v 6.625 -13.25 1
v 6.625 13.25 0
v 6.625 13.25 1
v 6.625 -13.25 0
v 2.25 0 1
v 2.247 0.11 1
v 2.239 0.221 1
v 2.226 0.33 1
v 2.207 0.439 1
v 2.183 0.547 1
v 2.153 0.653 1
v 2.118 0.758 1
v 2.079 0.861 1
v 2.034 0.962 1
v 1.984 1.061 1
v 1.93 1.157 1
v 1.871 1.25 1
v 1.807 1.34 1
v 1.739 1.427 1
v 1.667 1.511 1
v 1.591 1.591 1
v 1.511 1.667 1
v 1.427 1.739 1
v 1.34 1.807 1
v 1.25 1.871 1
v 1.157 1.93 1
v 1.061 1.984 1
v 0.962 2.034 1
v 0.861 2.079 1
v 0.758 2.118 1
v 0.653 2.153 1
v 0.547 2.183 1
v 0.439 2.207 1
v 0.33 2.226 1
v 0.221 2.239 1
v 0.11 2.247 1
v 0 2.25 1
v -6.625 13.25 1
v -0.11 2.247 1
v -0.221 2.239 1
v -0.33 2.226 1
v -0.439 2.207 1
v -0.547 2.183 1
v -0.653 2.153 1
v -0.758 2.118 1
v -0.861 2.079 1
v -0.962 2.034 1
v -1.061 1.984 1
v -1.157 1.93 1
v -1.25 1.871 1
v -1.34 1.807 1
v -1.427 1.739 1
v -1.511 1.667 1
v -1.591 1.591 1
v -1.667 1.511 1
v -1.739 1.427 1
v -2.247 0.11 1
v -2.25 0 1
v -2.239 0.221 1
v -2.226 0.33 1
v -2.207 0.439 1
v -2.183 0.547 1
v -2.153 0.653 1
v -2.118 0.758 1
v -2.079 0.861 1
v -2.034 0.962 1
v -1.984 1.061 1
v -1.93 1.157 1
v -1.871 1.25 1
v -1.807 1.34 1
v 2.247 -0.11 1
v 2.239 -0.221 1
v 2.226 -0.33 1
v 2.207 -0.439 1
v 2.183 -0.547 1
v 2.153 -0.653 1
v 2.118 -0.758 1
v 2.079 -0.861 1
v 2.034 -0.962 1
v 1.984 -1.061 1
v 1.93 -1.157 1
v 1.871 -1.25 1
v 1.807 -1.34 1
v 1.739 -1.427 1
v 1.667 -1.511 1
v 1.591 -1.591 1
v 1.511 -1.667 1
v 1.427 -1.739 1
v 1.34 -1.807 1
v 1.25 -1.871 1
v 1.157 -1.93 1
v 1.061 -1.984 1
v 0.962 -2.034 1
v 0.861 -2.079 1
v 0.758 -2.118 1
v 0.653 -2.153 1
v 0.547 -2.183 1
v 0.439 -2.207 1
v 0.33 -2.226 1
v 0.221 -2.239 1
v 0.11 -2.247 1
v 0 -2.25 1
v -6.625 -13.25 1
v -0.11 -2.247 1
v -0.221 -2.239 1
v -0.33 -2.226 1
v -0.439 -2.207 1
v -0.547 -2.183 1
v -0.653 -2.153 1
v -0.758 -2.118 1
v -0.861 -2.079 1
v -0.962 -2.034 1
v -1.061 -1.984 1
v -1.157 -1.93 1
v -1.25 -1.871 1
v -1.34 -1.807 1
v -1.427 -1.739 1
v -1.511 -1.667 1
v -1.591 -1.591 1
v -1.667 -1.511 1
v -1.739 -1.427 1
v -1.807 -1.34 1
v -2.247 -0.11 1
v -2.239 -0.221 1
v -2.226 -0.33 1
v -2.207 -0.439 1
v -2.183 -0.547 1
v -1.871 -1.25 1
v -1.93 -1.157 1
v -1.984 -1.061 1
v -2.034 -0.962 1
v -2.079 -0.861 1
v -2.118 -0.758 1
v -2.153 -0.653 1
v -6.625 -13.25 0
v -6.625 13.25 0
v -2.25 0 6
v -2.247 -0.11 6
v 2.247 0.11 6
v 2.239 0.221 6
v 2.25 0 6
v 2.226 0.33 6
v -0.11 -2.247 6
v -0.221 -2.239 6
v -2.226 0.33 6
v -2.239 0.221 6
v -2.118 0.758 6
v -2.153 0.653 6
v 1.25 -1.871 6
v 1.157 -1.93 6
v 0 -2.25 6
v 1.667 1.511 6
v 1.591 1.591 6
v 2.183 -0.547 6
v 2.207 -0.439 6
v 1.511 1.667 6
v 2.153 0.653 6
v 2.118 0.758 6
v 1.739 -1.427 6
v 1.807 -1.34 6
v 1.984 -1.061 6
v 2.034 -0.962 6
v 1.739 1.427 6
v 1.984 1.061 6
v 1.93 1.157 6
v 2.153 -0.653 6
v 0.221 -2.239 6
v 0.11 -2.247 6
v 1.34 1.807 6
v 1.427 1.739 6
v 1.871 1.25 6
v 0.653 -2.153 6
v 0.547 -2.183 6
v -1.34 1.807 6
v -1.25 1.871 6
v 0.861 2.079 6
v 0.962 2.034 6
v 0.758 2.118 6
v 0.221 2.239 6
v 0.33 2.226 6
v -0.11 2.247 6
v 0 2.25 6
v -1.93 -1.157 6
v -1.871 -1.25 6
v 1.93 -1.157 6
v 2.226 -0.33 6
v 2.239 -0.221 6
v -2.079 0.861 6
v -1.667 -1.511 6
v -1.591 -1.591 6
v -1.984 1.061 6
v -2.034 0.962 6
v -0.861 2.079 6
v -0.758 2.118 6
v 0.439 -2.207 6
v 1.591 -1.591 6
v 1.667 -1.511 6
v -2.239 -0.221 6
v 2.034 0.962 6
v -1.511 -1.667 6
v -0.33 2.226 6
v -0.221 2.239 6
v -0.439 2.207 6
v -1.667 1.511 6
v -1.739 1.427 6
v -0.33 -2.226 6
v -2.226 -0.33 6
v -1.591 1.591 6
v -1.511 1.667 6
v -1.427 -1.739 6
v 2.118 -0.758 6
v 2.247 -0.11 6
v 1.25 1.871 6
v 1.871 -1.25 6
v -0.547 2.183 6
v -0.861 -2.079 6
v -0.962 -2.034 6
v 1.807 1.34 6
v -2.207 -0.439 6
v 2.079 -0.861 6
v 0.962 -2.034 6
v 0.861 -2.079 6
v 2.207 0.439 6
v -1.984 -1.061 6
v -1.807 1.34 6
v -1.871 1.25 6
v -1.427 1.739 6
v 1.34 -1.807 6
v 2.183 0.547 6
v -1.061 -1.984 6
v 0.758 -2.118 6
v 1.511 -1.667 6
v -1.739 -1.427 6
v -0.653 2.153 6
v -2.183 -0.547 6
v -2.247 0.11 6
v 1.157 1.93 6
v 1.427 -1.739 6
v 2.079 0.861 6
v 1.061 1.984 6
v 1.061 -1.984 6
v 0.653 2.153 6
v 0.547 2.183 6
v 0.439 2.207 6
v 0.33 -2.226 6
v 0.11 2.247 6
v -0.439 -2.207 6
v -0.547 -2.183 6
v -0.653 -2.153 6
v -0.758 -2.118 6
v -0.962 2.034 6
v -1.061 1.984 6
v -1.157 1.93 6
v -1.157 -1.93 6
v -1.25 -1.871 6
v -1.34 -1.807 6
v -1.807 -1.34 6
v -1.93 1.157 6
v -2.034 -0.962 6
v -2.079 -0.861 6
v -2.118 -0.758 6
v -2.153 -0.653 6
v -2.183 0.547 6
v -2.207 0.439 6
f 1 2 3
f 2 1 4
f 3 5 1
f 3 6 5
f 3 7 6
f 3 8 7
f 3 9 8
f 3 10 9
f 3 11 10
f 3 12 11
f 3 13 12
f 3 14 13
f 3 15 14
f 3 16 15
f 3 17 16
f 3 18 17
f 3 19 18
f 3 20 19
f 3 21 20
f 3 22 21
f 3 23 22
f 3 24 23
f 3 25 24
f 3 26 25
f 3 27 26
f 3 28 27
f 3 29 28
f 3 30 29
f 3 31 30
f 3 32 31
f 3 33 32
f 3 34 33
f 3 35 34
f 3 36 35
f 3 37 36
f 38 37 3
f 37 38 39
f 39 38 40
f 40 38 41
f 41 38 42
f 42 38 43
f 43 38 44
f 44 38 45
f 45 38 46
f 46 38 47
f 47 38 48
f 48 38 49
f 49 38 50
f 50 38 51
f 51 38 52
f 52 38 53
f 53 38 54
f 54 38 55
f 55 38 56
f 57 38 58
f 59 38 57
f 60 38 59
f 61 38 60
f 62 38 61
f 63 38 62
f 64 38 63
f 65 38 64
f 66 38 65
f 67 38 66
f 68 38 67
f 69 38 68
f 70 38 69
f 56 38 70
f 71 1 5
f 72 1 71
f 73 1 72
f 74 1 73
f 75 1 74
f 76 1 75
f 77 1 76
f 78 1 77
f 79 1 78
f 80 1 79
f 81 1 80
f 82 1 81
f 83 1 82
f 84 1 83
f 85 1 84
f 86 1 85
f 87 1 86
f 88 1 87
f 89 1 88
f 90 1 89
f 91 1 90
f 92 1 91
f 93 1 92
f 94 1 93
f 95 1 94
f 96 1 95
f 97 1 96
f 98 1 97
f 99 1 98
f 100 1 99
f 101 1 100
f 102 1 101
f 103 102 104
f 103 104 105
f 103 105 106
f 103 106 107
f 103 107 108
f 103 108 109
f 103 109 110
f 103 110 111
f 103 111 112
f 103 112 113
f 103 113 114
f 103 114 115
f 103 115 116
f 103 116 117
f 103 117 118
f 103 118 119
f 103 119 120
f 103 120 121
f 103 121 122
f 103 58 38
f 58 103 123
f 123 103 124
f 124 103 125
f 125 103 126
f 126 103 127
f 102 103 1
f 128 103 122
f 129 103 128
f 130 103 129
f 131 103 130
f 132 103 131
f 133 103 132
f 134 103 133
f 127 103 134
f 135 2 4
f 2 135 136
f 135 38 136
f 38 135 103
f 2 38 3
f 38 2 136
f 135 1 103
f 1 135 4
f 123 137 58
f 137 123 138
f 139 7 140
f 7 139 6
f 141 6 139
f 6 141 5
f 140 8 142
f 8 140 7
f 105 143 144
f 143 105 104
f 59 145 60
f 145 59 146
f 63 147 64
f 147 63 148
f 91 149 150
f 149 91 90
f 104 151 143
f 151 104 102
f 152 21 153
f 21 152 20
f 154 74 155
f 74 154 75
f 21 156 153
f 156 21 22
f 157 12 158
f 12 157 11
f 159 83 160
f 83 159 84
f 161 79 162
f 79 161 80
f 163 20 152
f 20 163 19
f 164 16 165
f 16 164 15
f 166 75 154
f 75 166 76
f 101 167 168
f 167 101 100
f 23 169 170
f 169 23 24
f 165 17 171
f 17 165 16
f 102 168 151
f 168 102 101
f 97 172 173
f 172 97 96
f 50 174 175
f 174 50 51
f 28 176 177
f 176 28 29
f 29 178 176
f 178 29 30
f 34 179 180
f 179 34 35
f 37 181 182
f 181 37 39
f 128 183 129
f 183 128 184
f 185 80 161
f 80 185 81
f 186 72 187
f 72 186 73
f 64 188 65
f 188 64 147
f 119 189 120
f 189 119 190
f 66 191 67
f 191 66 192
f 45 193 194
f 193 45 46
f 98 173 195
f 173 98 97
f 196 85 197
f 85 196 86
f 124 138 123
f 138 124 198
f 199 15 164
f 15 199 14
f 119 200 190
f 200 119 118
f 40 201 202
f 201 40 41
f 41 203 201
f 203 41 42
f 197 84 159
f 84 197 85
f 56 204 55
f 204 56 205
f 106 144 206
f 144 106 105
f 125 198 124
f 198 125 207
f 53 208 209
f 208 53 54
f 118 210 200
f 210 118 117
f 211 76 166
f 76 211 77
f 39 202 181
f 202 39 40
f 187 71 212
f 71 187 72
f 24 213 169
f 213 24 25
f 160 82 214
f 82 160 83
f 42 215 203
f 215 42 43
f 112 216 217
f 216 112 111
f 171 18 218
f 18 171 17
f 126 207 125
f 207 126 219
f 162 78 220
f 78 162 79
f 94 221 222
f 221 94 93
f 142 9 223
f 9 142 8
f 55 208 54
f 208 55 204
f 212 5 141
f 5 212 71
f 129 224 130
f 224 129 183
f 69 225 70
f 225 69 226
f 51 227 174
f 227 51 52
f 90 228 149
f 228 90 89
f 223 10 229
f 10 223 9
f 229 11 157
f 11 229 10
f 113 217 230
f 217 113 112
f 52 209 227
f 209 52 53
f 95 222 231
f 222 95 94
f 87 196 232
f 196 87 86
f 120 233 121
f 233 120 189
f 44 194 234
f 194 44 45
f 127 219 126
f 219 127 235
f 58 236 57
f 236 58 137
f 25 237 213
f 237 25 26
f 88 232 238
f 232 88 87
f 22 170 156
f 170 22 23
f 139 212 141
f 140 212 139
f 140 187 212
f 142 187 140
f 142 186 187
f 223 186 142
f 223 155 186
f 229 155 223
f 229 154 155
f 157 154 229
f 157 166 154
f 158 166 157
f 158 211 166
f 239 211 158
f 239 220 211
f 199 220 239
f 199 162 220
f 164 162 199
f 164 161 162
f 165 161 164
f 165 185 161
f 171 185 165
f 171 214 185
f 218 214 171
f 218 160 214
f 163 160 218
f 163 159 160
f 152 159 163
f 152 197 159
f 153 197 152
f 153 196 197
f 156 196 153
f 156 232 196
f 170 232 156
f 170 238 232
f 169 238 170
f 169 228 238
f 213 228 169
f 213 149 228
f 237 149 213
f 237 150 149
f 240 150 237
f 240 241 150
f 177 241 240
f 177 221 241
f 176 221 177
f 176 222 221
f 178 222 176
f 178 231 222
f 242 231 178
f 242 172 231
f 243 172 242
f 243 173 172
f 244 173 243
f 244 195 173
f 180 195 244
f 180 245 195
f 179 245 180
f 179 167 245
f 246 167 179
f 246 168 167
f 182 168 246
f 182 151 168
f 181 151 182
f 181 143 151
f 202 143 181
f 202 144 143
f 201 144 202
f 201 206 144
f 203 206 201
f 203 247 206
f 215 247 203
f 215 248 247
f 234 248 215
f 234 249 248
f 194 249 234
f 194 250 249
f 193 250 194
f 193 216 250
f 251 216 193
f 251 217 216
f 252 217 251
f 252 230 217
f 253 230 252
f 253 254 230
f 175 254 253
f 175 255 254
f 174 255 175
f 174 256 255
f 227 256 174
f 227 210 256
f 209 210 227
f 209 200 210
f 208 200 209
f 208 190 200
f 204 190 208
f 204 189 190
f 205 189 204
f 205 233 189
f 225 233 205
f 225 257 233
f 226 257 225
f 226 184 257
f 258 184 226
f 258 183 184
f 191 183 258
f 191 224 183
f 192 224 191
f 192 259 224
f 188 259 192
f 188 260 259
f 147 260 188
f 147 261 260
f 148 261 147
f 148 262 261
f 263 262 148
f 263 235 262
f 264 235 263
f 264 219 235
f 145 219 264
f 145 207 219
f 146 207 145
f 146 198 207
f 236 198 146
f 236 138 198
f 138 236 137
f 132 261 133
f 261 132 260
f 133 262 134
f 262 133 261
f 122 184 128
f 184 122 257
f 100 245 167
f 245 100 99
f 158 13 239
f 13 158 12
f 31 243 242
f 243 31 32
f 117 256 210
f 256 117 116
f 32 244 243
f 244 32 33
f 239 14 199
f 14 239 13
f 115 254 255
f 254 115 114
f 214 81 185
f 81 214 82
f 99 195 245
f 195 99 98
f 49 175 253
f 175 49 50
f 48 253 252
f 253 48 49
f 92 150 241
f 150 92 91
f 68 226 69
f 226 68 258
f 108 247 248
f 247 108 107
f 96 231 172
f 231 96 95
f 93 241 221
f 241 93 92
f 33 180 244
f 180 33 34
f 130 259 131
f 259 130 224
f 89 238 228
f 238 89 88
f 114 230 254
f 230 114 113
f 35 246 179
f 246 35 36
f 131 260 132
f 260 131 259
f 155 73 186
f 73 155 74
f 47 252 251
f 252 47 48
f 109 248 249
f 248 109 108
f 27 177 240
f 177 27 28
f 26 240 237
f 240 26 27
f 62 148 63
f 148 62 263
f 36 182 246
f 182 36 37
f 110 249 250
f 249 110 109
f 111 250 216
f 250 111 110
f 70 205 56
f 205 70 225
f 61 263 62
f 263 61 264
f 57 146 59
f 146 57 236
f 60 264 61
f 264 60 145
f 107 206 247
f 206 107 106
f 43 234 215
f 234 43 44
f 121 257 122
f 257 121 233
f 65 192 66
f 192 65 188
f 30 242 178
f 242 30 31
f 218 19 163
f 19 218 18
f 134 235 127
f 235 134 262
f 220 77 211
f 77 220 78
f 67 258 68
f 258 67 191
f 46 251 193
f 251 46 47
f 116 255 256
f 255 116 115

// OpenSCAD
/* RailEduKit/InteractiveSignallingLaboratory © 2025 by Martin Scheidt and contributor
 * License: CC-BY 4.0 - https://creativecommons.org/licenses/by/4.0/
 * Project description: The Interactive Signalling Laboratory is a tool for training in Rail
 * Applications to enhance the knowledge of control and signalling principles for rail transport systems.
 *
 * Module: Balise
 * Description: Balise is a component that is used to detect the presence of a train.
 * It is used to control the train's speed and direction.
 * It is also used to detect the train's position.
 */

// Include configuration file
include <config.scad>

module balise(){
    translate([0,0,balise_height/2]) cube([balise_width, balise_depth, balise_height], center = true);
    translate([0,0,balise_height]) cylinder(d=balise_pin_diameter, h=balise_pin_height);
}

balise();
